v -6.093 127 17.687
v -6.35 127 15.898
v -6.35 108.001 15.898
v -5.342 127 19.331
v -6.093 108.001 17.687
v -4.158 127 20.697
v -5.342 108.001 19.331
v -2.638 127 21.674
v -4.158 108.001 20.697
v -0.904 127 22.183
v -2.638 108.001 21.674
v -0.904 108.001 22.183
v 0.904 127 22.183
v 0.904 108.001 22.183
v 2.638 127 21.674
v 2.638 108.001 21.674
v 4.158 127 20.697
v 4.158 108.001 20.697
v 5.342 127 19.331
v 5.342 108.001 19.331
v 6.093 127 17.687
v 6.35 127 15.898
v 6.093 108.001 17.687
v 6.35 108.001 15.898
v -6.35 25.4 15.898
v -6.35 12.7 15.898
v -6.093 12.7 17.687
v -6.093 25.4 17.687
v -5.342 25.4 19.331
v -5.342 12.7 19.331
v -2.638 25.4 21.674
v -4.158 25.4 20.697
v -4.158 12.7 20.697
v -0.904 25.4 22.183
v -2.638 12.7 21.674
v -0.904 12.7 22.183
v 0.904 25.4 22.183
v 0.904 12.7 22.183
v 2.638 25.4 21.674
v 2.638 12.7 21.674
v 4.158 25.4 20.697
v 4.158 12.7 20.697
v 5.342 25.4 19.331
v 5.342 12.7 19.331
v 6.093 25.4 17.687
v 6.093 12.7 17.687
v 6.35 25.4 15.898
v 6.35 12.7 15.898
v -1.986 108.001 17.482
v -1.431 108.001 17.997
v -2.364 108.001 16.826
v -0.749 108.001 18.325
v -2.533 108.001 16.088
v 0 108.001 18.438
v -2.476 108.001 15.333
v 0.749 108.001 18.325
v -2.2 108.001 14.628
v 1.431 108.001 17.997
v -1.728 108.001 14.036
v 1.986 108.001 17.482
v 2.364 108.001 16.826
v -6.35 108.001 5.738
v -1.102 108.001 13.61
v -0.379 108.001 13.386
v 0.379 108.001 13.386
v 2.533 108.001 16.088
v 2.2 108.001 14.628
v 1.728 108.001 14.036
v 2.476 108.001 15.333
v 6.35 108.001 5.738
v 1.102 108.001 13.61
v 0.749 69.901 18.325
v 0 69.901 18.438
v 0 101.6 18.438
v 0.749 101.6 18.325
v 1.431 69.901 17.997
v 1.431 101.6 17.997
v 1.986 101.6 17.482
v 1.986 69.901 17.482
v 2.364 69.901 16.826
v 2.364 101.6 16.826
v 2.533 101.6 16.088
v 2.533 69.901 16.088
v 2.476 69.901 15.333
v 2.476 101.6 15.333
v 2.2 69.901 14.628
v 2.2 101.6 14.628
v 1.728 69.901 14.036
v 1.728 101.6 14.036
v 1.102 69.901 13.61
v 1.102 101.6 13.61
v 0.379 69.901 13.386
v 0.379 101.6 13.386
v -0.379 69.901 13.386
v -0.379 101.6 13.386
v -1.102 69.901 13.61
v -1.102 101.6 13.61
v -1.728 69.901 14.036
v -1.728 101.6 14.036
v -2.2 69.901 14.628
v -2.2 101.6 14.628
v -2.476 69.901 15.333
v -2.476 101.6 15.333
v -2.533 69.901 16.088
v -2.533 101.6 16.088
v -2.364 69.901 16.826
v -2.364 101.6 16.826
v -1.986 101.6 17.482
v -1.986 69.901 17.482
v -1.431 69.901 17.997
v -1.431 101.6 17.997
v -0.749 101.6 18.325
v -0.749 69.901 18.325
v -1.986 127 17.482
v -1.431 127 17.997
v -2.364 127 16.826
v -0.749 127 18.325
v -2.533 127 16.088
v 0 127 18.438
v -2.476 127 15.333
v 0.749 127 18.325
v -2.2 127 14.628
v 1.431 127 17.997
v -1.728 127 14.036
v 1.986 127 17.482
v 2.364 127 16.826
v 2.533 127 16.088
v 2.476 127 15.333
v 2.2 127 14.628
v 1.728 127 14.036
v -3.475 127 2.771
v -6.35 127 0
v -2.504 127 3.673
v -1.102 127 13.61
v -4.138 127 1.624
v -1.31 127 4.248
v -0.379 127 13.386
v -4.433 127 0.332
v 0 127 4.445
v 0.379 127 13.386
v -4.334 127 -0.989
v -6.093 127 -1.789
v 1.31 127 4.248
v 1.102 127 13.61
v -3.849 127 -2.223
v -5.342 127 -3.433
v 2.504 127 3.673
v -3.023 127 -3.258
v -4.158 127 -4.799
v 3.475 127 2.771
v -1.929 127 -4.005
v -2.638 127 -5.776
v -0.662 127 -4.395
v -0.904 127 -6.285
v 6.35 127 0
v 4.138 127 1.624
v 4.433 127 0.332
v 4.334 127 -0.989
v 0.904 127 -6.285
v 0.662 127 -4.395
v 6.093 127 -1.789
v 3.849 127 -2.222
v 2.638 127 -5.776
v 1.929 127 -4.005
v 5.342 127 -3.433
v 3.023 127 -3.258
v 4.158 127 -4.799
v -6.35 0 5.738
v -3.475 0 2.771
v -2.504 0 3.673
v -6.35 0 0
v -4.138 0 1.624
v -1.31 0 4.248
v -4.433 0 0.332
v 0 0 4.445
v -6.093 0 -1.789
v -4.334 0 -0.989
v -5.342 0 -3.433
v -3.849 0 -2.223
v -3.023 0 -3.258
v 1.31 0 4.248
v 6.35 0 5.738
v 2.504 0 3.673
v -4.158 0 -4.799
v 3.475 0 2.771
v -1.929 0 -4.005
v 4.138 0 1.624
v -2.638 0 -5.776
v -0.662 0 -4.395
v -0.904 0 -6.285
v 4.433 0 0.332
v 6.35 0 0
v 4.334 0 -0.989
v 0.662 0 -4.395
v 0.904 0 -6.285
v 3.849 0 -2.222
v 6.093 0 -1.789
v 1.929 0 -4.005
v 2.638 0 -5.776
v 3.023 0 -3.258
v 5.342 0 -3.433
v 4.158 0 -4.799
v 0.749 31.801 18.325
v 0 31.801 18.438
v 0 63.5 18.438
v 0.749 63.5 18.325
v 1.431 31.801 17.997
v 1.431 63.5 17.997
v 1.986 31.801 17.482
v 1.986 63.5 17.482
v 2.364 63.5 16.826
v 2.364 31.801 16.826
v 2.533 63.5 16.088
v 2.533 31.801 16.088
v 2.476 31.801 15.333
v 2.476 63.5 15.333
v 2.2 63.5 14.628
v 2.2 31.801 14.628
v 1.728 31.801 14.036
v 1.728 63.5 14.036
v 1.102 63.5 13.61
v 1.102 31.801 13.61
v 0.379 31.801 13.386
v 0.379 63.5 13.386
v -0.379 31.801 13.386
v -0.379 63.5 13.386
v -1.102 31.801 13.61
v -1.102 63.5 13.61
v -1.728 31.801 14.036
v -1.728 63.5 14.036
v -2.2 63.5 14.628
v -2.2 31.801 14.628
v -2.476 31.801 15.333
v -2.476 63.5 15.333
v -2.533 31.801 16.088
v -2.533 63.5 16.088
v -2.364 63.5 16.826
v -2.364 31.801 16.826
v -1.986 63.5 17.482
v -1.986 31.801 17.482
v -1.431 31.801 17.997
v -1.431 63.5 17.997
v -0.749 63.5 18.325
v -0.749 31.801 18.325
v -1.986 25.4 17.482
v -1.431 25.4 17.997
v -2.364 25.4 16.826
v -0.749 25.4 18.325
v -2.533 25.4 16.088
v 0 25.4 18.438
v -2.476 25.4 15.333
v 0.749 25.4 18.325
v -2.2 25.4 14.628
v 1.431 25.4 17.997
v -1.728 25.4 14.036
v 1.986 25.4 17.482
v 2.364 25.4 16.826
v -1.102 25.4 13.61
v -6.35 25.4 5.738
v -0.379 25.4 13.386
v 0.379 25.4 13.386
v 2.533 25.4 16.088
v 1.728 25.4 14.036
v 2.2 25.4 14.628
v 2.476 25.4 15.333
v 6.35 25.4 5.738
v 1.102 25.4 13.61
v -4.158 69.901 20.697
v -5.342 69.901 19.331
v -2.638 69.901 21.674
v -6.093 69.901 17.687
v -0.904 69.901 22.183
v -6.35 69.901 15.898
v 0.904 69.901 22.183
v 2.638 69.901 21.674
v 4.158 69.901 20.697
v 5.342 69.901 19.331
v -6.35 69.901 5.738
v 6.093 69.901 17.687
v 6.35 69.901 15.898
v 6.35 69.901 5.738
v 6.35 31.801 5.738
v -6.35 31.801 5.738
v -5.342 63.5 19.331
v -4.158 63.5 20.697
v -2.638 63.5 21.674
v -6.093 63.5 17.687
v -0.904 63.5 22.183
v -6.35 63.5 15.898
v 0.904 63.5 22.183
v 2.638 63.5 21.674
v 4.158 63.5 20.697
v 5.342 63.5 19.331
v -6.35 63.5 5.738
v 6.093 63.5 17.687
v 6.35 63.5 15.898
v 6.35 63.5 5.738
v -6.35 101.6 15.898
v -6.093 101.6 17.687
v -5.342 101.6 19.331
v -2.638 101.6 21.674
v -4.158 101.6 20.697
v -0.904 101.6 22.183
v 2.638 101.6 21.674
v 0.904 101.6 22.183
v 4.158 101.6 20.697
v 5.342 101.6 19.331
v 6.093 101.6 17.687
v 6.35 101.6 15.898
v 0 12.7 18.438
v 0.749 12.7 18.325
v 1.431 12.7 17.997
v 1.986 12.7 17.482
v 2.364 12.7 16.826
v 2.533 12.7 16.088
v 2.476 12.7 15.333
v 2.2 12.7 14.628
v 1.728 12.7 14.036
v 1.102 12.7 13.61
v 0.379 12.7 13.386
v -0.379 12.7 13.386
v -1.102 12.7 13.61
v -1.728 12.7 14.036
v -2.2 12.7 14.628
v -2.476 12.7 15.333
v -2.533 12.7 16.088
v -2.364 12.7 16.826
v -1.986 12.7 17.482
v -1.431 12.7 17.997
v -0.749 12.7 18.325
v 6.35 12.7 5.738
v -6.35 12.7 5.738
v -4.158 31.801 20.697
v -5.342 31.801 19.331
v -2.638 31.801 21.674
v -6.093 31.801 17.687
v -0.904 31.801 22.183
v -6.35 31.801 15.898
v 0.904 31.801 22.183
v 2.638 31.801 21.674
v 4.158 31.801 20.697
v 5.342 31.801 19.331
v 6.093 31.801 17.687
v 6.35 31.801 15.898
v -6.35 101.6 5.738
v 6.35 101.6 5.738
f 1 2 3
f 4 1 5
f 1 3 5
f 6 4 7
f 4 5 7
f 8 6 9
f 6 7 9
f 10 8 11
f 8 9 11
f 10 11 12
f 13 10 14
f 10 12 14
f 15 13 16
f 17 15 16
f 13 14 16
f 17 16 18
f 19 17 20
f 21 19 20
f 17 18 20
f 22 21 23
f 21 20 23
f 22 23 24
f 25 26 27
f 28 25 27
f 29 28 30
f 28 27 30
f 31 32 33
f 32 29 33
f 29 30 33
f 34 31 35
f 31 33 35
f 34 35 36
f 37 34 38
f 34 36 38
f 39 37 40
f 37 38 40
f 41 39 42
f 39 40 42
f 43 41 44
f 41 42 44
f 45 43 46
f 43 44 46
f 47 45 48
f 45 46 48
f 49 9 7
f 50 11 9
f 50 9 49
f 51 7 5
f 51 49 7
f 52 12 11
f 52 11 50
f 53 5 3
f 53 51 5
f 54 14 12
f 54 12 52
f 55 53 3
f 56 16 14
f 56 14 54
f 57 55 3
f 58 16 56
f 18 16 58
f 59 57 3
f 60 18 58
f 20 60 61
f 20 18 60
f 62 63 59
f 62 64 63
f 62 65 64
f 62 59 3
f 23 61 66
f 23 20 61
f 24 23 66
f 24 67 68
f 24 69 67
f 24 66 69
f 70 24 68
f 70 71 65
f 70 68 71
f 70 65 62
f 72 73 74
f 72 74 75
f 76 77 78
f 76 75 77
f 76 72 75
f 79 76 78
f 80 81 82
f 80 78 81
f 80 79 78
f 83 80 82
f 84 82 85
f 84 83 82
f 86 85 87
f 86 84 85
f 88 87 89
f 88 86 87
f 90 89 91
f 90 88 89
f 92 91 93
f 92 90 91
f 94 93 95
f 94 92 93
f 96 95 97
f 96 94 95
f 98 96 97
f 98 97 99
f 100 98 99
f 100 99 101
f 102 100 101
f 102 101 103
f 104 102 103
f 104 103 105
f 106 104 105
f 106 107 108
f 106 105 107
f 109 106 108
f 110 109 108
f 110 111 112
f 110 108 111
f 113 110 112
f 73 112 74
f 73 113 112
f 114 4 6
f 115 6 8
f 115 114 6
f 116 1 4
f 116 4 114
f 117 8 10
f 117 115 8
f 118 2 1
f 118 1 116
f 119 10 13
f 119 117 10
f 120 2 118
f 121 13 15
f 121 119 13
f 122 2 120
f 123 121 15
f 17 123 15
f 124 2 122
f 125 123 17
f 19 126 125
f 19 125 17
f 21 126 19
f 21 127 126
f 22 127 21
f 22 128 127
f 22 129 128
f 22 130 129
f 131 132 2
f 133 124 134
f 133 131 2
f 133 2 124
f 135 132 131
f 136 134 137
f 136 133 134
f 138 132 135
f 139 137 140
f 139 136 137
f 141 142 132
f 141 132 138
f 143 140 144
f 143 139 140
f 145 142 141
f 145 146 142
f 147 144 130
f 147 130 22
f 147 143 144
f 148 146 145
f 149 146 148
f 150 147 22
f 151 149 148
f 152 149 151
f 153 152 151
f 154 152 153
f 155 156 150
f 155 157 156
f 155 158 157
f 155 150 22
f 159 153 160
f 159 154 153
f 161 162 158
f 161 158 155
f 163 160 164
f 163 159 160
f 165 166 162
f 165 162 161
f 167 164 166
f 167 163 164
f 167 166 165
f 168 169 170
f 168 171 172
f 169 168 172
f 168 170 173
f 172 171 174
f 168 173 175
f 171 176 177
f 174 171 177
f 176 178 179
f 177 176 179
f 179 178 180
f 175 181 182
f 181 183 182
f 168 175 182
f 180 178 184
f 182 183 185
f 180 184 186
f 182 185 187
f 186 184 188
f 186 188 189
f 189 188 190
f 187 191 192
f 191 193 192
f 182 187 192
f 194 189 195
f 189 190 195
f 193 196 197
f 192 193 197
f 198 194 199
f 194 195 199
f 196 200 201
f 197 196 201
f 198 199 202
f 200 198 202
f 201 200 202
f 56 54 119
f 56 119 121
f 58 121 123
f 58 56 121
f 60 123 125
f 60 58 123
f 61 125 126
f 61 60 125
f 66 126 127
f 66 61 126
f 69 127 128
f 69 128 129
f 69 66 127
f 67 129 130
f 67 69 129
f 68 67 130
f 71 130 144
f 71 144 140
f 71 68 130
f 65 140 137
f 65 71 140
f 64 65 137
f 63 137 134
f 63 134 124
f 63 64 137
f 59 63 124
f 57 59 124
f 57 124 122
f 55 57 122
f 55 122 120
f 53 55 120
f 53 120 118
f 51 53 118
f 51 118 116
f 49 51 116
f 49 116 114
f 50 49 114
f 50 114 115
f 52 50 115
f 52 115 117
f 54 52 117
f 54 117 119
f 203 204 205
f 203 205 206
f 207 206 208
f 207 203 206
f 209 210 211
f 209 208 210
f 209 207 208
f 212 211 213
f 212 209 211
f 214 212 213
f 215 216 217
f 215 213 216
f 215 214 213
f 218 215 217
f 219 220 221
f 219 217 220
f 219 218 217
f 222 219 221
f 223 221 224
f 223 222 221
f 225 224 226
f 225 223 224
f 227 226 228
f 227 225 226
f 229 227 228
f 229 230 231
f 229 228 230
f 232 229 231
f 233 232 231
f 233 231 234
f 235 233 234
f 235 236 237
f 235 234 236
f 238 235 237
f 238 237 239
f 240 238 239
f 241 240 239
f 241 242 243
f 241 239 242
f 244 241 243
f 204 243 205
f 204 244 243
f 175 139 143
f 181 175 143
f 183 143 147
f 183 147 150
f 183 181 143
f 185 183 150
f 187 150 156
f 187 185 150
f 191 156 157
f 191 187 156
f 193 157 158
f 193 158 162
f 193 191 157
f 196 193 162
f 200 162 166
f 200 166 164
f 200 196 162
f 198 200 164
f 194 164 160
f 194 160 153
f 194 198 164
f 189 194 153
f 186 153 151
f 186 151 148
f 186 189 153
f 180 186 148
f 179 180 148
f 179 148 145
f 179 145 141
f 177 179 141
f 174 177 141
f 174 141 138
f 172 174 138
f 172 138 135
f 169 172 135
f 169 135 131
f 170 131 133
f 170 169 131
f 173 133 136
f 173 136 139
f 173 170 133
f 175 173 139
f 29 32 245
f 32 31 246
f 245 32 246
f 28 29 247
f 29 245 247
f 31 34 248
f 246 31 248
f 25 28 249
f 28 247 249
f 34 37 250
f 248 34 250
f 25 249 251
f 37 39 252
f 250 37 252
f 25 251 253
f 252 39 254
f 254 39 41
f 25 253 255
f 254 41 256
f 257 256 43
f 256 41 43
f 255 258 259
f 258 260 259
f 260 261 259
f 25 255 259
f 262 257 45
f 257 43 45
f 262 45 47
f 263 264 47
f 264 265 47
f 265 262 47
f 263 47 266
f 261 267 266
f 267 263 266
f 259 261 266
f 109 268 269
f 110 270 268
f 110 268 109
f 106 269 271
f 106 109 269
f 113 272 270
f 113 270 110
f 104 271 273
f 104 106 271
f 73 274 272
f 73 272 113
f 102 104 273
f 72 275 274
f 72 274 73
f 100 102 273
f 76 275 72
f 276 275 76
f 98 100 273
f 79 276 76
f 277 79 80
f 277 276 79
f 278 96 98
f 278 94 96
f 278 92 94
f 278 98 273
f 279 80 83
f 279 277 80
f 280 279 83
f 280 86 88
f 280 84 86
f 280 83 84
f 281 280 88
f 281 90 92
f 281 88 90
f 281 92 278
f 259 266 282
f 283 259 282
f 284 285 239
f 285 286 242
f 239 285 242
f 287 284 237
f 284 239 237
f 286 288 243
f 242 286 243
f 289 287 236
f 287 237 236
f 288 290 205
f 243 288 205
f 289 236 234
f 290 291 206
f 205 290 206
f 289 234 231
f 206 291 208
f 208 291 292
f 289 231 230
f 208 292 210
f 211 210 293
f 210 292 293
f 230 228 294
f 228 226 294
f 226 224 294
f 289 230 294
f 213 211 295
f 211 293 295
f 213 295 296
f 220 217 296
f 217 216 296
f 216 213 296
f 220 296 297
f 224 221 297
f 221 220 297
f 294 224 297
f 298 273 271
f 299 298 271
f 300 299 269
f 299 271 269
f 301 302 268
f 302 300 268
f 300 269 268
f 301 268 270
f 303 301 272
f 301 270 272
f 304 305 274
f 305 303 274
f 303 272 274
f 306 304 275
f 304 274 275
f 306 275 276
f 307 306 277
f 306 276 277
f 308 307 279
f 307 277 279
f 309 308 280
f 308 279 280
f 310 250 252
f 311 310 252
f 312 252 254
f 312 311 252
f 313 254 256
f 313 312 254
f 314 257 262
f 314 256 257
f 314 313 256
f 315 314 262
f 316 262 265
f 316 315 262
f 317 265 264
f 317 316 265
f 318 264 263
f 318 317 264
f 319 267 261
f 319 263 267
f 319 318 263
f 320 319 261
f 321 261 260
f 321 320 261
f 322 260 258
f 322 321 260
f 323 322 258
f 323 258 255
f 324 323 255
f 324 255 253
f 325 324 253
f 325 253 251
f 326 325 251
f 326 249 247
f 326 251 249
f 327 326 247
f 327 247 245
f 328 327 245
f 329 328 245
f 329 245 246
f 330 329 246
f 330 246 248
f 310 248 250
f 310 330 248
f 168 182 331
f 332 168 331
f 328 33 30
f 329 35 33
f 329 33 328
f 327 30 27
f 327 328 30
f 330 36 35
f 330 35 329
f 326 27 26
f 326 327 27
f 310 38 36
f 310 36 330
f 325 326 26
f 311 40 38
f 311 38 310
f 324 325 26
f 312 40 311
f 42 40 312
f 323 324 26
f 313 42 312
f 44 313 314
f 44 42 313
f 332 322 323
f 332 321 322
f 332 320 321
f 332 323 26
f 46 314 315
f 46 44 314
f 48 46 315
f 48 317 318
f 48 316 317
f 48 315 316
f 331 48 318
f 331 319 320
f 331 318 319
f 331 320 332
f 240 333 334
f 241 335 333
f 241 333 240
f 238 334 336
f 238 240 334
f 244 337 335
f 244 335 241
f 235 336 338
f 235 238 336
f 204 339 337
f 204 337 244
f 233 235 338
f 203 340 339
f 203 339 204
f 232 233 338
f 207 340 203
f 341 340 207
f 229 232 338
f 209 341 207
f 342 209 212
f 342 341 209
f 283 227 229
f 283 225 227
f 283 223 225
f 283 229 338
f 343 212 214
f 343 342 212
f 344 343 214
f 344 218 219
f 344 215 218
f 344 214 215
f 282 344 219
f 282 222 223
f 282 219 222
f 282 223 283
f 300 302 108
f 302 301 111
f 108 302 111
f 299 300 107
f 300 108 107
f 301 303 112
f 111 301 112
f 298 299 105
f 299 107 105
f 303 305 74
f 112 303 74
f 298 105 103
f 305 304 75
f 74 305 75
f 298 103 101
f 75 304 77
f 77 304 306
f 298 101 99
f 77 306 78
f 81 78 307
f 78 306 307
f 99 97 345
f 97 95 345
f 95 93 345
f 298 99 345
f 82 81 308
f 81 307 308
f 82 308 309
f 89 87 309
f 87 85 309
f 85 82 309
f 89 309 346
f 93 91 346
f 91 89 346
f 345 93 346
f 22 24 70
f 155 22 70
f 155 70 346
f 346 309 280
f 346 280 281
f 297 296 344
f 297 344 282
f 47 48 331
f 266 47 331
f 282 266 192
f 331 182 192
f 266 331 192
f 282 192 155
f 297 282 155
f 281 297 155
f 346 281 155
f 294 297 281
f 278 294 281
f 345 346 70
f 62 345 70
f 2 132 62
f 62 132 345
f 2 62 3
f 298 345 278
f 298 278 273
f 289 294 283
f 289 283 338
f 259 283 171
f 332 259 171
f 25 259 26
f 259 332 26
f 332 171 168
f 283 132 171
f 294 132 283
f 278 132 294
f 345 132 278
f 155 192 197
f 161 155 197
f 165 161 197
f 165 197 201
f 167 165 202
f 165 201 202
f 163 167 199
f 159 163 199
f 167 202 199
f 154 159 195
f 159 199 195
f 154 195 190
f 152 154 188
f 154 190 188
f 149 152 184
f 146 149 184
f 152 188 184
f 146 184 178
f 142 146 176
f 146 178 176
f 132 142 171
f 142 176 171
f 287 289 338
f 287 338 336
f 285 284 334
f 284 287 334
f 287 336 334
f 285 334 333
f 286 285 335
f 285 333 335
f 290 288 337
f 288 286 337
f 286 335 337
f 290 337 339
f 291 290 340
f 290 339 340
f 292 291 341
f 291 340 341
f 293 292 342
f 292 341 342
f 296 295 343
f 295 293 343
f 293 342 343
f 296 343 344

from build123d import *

# Parameters (mm, degrees)
SKETCH2_R           = 6.35
SKETCH2_R_2         = 4.445
BOSS_EXTRUDE1_DEPTH = 127
BOSS_EXTRUDE2_START = -127
SKETCH3_R           = 2.54
BOSS_EXTRUDE2_DEPTH = 127
SKETCH4_W           = 31.75
SKETCH4_H           = 6.4008
SKETCH4_H_2         = 12.7
CUT_EXTRUDE1_DEPTH  = 127


with BuildPart() as part:
    # Sketch2 → Boss-Extrude1 (new body)
    with BuildSketch(Plane(origin=(0, 0, 0), x_dir=(1, 0, 0), z_dir=(0, 1, 0))):
        with Locations(Location((0, 0, 0), (0, 0, 270))):
            Circle(SKETCH2_R)
        with Locations(Location((0, 0, 0), (0, 0, 270))):
            Circle(SKETCH2_R_2, mode=Mode.SUBTRACT)
    extrude(amount=BOSS_EXTRUDE1_DEPTH)

    # Sketch3 → Boss-Extrude2 (add)
    with BuildSketch(Plane(origin=(0, 127, 0), x_dir=(1, 0, 0), z_dir=(0, 1, 0)).offset(BOSS_EXTRUDE2_START)):
        with BuildLine():
            Line((-6.35, 0), (-6.35, -15.898089304))
            ThreePointArc((-6.35, -15.898089304), (0, -22.248089304), (6.35, -15.898089304))
            Line((6.35, -15.898089304), (6.35, 0))
            ThreePointArc((6.35, 0), (0, -6.35), (-6.35, 0))
        make_face()
        with Locations(Location((0, -15.898089304, 0), (0, 0, 270))):
            Circle(SKETCH3_R, mode=Mode.SUBTRACT)
    extrude(amount=BOSS_EXTRUDE2_DEPTH)

    # Sketch4 → Cut-Extrude1 (cut)
    with BuildSketch(Plane(origin=(6.35, 0, 0), x_dir=(0, 0, -1), z_dir=(1, 0, 0))):
        with Locations((-21.613089304, 28.6004)):
            Rectangle(SKETCH4_W, SKETCH4_H)
        with Locations((-21.613089304, 66.7004)):
            Rectangle(SKETCH4_W, SKETCH4_H)
        with Locations((-21.613089304, 104.8004)):
            Rectangle(SKETCH4_W, SKETCH4_H)
        with Locations((-21.613089304, 6.35)):
            Rectangle(SKETCH4_W, SKETCH4_H_2)
    extrude(amount=-CUT_EXTRUDE1_DEPTH, mode=Mode.SUBTRACT)


solid = part.part
